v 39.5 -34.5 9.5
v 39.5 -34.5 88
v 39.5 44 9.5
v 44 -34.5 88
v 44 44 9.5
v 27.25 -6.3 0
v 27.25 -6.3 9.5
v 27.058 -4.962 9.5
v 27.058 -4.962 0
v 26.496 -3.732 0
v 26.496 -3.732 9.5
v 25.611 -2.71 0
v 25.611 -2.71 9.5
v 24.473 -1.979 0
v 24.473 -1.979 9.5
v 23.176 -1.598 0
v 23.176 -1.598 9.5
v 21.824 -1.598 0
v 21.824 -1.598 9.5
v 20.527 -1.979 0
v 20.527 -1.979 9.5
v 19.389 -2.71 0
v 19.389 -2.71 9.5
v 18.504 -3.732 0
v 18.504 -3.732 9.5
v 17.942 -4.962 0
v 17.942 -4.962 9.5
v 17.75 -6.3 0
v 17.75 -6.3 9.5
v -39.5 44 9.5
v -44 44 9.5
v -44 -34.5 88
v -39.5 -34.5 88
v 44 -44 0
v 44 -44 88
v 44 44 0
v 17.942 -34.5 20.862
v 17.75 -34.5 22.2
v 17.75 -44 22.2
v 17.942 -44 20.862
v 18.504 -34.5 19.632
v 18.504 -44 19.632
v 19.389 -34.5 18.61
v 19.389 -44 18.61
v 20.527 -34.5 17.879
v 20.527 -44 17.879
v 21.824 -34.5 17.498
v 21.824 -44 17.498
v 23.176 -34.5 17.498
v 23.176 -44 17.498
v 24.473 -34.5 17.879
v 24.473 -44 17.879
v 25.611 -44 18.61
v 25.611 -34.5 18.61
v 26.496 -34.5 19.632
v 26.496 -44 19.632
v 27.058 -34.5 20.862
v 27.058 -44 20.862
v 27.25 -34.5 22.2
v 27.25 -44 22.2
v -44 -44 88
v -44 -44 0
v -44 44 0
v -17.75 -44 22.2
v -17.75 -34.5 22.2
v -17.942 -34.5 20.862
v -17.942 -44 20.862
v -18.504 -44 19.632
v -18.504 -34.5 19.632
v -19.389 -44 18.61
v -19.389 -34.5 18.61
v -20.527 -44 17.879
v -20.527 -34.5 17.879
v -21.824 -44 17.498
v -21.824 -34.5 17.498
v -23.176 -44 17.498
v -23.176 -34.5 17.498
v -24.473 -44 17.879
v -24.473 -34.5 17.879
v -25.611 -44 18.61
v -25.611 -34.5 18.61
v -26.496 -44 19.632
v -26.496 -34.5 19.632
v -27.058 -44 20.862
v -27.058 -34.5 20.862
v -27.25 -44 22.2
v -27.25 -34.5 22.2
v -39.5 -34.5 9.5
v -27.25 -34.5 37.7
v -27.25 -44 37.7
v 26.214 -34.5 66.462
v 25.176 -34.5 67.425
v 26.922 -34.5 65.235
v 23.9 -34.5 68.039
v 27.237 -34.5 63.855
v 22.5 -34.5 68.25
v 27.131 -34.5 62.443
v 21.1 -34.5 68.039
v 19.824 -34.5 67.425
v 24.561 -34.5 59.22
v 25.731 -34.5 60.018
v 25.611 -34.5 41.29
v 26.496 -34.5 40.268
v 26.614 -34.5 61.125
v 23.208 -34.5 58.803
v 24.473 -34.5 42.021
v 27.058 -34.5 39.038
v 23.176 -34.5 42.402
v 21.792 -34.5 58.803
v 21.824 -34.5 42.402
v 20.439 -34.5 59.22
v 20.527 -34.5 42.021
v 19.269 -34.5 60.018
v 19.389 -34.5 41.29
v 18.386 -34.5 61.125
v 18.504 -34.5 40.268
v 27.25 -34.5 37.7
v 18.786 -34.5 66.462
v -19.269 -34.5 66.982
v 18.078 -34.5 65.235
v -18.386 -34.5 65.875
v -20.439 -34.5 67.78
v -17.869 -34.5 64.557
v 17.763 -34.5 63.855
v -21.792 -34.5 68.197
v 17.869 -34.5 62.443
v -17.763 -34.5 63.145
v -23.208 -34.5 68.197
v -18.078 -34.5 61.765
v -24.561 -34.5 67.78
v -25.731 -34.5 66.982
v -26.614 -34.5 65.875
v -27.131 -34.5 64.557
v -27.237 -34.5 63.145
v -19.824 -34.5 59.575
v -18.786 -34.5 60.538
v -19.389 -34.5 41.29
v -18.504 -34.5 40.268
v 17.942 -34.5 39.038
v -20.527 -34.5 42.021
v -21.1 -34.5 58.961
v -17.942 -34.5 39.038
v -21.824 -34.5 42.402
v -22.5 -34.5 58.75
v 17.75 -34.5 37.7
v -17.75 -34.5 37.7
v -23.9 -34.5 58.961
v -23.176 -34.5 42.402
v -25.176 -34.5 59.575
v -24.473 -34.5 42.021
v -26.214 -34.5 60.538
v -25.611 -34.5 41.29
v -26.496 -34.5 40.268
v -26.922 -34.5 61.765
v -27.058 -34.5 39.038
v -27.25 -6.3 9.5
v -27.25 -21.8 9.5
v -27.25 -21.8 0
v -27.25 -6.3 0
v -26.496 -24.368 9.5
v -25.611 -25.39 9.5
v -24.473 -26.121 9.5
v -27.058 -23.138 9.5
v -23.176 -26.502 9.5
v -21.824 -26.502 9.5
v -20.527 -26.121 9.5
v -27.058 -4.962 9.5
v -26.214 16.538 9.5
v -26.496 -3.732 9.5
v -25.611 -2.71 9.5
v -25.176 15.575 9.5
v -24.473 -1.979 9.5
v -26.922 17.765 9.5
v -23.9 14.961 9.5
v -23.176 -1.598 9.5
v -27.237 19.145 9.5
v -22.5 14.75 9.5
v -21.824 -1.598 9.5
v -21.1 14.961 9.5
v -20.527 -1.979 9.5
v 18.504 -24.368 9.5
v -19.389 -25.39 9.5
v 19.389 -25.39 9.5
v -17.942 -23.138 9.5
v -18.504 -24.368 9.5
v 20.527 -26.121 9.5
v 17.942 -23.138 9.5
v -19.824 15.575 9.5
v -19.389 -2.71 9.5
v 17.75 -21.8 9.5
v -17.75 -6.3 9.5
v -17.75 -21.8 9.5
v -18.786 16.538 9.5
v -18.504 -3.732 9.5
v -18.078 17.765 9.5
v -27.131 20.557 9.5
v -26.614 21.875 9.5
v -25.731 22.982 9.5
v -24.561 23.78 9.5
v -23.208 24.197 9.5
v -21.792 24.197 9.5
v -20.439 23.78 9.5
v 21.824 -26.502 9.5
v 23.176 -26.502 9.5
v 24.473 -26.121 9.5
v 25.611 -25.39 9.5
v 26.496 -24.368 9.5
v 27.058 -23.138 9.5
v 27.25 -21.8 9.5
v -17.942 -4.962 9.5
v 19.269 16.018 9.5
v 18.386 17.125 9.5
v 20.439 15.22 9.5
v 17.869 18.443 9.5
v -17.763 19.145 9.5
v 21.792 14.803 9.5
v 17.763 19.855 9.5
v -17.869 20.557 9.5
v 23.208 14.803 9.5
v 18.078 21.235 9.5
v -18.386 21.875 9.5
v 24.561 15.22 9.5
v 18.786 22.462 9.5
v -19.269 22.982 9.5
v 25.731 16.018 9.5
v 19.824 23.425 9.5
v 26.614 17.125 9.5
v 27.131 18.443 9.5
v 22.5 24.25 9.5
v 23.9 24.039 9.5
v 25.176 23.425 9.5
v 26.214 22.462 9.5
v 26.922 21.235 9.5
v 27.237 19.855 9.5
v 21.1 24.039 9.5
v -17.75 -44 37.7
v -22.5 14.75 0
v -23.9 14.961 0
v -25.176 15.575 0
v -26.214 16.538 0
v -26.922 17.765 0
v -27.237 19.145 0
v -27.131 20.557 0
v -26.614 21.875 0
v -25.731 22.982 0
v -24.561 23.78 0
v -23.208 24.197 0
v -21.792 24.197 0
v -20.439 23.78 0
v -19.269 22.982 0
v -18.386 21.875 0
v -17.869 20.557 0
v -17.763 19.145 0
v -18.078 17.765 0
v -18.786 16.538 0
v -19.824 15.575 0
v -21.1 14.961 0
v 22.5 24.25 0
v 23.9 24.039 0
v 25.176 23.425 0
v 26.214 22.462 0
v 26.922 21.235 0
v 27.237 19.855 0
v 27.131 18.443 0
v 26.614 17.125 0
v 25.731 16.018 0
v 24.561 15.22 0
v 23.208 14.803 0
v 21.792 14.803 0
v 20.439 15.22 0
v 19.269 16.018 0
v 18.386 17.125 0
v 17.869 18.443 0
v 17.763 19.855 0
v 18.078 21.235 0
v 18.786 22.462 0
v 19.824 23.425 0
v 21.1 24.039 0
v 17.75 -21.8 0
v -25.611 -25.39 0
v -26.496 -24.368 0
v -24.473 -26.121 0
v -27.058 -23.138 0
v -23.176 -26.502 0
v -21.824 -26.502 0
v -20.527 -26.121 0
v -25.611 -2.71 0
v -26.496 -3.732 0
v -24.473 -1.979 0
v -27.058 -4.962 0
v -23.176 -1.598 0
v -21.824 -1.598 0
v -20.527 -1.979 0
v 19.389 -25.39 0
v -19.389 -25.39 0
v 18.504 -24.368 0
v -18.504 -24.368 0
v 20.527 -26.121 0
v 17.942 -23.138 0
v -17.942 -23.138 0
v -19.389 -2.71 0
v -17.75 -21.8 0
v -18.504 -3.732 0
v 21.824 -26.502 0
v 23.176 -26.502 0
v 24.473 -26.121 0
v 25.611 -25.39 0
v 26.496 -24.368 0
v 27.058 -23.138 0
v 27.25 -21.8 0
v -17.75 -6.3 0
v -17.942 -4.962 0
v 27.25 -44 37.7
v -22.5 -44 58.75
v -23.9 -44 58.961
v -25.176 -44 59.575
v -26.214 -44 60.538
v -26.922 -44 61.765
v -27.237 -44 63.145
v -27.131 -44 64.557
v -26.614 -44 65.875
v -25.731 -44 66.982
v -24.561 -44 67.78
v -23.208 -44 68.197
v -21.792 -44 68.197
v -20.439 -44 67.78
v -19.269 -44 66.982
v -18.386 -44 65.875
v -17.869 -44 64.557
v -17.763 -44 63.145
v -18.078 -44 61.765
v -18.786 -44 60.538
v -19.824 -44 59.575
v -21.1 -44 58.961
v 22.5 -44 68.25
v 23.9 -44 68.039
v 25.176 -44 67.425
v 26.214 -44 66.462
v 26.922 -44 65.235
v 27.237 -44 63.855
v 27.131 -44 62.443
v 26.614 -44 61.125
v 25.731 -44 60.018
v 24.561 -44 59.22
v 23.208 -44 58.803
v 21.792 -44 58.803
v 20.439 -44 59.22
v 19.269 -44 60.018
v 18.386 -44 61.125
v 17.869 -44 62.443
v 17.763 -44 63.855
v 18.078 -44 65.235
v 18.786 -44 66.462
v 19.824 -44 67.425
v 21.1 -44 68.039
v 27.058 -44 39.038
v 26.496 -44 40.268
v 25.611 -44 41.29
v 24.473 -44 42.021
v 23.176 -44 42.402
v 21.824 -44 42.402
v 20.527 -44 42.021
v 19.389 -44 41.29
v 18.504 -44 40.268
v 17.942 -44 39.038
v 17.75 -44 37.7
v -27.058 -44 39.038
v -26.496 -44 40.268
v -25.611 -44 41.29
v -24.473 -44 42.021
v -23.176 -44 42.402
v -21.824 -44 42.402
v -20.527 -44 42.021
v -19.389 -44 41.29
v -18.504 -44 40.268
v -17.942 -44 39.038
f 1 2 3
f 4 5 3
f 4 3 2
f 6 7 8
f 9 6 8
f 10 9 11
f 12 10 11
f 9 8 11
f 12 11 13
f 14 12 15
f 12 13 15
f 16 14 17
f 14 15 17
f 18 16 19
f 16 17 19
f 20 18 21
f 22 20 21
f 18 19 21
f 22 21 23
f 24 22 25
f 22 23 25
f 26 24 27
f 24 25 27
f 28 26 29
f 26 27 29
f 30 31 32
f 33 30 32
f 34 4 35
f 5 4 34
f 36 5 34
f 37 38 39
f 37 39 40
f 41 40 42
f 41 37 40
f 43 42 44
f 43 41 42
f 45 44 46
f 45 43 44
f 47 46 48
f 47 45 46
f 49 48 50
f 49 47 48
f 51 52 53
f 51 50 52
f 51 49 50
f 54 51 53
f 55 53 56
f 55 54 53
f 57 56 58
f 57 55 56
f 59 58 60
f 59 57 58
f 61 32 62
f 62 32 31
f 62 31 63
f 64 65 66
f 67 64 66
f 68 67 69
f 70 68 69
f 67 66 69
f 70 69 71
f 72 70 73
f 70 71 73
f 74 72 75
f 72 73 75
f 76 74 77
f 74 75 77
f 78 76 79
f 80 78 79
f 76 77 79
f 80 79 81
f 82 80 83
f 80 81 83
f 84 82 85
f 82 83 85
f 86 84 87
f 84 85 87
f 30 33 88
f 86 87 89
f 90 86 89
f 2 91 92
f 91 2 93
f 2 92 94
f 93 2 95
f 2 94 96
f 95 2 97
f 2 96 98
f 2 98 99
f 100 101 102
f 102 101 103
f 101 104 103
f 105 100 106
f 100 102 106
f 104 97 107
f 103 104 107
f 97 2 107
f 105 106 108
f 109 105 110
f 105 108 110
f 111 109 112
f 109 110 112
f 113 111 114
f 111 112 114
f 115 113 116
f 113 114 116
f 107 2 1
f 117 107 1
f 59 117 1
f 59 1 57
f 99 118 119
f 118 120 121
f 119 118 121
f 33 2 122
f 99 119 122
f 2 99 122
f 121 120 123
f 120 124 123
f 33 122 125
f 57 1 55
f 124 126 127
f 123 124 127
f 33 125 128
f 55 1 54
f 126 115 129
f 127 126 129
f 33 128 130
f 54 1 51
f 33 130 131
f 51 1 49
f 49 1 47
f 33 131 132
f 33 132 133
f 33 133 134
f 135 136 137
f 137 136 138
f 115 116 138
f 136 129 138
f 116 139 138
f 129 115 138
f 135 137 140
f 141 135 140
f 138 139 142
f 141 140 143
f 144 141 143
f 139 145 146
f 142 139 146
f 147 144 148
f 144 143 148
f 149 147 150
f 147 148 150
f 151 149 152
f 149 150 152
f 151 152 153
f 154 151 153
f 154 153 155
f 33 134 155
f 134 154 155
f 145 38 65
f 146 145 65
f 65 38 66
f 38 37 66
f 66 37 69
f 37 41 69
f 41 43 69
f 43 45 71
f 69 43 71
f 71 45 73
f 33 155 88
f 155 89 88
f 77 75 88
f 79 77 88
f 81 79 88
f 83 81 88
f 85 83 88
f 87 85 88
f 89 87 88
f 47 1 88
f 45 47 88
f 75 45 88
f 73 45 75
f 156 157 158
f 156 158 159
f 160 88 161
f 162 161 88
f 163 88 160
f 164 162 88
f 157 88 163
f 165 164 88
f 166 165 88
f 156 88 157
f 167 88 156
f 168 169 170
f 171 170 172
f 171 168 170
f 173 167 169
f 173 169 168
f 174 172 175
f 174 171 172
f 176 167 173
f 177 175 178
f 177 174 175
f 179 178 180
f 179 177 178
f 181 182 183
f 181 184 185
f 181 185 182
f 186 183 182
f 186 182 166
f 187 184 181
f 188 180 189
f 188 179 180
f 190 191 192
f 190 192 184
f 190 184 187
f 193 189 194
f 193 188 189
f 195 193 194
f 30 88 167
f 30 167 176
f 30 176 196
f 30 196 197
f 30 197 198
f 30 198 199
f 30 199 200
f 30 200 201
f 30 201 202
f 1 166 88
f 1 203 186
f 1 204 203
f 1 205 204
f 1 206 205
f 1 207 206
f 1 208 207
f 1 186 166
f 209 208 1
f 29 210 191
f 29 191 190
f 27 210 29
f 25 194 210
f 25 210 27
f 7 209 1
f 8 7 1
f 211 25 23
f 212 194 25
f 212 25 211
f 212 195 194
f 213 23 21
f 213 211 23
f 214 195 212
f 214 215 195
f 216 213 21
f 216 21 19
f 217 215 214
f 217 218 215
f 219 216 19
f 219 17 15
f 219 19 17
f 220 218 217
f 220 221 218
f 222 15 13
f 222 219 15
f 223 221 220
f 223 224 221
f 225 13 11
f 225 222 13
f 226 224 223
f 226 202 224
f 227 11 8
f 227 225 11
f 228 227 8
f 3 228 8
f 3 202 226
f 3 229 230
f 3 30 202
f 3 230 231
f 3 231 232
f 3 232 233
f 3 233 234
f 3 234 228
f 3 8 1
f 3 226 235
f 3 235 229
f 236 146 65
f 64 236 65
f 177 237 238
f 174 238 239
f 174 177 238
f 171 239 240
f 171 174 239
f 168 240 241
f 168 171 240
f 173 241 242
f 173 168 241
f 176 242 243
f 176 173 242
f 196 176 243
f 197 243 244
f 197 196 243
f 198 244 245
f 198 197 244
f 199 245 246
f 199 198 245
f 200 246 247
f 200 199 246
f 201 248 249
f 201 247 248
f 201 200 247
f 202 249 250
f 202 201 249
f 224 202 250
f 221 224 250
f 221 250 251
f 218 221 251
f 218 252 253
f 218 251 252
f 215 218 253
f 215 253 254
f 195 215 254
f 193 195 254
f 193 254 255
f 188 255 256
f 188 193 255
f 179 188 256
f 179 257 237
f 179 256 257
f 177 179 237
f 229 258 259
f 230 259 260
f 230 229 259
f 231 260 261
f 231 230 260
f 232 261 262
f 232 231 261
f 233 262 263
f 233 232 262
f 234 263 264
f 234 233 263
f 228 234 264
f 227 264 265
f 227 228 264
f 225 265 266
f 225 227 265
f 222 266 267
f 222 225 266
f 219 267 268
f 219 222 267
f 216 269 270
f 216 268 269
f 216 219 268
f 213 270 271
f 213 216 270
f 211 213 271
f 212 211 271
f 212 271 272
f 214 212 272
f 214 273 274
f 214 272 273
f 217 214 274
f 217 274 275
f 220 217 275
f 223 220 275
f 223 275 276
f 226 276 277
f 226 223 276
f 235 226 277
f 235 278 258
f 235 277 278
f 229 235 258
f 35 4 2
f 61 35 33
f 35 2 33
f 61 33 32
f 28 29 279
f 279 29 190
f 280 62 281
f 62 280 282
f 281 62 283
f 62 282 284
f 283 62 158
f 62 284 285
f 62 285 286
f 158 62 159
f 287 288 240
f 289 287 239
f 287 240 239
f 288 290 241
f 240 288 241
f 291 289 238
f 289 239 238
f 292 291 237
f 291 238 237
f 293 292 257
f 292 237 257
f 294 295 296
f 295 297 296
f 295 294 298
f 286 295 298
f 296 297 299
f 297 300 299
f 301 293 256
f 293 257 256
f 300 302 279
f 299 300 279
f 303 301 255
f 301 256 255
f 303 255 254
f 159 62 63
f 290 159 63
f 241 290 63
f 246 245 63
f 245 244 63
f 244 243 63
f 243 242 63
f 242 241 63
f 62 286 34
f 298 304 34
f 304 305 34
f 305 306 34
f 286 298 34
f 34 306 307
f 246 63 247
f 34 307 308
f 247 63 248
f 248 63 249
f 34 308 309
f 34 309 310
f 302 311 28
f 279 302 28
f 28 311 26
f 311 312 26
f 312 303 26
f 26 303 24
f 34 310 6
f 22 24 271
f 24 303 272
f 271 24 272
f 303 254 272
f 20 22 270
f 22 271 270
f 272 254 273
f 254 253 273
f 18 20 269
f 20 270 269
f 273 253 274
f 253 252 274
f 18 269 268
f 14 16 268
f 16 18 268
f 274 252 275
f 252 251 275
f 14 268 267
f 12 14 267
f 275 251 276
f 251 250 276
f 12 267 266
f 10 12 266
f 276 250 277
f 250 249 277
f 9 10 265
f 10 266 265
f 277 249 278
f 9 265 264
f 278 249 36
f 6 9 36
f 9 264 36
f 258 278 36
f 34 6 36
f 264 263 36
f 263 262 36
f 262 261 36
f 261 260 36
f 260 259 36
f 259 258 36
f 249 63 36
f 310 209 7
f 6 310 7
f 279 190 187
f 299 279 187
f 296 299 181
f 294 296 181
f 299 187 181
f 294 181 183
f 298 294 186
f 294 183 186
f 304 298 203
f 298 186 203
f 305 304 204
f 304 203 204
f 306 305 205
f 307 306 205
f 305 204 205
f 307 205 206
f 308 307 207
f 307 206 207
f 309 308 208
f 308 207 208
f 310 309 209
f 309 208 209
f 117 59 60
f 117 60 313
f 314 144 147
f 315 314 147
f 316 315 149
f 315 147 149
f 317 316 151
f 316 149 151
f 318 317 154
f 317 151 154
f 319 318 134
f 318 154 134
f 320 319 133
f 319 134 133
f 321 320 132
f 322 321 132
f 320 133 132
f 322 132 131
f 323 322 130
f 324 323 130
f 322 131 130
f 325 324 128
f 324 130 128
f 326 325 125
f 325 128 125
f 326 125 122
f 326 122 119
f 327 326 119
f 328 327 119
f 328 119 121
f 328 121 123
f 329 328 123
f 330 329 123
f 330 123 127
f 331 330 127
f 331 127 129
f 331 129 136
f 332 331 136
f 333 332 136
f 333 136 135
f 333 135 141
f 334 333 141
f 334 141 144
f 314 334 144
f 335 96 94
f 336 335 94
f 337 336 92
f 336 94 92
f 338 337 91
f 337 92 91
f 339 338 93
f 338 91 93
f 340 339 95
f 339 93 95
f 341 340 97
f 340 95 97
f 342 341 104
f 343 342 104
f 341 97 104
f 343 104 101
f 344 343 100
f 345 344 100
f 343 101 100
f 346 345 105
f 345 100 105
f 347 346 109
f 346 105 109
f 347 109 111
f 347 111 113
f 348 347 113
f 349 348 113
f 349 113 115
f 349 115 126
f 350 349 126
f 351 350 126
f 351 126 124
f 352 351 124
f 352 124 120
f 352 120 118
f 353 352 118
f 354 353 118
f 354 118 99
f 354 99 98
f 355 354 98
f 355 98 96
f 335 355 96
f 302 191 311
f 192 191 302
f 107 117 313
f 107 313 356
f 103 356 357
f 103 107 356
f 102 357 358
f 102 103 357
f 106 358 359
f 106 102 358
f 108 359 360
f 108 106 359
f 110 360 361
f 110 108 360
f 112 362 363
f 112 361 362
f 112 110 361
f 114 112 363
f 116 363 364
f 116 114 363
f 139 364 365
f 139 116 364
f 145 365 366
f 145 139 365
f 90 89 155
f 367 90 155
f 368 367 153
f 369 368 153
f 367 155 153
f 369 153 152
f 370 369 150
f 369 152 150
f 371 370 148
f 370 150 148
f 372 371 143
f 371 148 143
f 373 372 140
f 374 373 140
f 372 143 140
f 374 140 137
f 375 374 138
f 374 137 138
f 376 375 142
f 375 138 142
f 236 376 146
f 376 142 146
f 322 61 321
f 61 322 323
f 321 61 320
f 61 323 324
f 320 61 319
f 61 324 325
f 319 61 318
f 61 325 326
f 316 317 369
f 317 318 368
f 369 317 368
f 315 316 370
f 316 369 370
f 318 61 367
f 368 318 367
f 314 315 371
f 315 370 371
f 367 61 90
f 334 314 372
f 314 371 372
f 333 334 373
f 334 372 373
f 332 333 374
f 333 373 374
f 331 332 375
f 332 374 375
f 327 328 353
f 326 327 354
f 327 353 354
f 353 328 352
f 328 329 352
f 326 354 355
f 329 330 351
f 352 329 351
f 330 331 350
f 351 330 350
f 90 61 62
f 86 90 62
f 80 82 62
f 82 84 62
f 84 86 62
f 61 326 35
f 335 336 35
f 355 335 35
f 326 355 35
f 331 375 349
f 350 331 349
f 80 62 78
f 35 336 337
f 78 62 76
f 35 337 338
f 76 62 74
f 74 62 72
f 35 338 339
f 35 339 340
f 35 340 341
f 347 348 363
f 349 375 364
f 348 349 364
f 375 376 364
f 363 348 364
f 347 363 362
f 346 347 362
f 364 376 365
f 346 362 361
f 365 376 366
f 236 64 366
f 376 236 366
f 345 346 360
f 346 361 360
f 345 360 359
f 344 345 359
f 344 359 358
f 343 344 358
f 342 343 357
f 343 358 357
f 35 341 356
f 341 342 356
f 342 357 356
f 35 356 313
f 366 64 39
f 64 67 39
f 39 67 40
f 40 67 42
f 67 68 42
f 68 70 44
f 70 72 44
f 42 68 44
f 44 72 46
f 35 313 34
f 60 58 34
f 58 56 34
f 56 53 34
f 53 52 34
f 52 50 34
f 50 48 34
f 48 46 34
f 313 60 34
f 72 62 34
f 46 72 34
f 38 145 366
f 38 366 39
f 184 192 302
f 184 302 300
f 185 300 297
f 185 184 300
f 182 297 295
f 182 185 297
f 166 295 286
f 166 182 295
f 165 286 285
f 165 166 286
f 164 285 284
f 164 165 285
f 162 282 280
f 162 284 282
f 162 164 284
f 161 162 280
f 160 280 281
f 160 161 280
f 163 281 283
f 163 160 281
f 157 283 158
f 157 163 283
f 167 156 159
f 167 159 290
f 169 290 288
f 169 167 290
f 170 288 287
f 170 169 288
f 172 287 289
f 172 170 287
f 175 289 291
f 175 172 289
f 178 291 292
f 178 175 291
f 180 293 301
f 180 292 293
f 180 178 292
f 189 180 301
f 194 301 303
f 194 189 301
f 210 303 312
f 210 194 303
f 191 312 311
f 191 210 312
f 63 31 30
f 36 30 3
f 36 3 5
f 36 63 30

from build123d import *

# Parameters (mm, degrees)
SKETCH_1_W          = 88
SKETCH_1_H          = 88
EXTRUDE_1_DEPTH     = 9.5
SKETCH_2_W          = 88
SKETCH_2_H          = 9.5
EXTRUDE_2_DEPTH     = 88
EXTRUDE_3_DEPTH     = 4.5
SKETCH_4_R          = 4.75
CUT_EXTRUDE_1_DEPTH = 126.866000175


with BuildPart() as part:
    # 草图1 → 凸台-拉伸1 (new body)
    with BuildSketch(Plane.XY):
        Rectangle(SKETCH_1_W, SKETCH_1_H)
    extrude(amount=EXTRUDE_1_DEPTH)

    # 草图2 → 凸台-拉伸2 (add)
    with BuildSketch(Plane(origin=(0, 0, 0), x_dir=(-1, 0, 0), z_dir=(0, 0, -1))):
        with Locations((0, -39.25)):
            Rectangle(SKETCH_2_W, SKETCH_2_H)
    extrude(amount=-EXTRUDE_2_DEPTH)

    # 草图3 → 凸台-拉伸3 (add)
    with BuildSketch(Plane.ZY.offset(44)):
        Polygon((9.5, 44), (88, -34.5), (9.5, -34.5), align=None)
    extrude_3 = extrude(amount=-EXTRUDE_3_DEPTH)

    # 镜向1: 凸台-拉伸3 across plane
    add(extrude_3.mirror(Plane(origin=(0, 0, 0), x_dir=(0, 0, 1), z_dir=(1, 0, 0))))

    # 草图4 → 切除-拉伸1 (cut, through all)
    with BuildSketch(Plane(origin=(0, -34.5, 0), x_dir=(1, 0, 0), z_dir=(0, 1, 0))):
        with Locations(Location((22.5, -63.5, 0), (0, 0, 270))):
            Circle(SKETCH_4_R)
        with Locations(Location((-22.5, -63.5, 0), (0, 0, 90))):
            Circle(SKETCH_4_R)
        with BuildLine():
            Line((17.75, -37.7), (17.75, -22.2))
            ThreePointArc((17.75, -22.2), (22.5, -17.45), (27.25, -22.2))
            Line((27.25, -22.2), (27.25, -37.7))
            ThreePointArc((27.25, -37.7), (22.5, -42.45), (17.75, -37.7))
        make_face()
        with BuildLine():
            Line((-17.75, -37.7), (-17.75, -22.2))
            ThreePointArc((-17.75, -22.2), (-22.5, -17.45), (-27.25, -22.2))
            Line((-27.25, -22.2), (-27.25, -37.7))
            ThreePointArc((-27.25, -37.7), (-22.5, -42.45), (-17.75, -37.7))
        make_face()
    cut_extrude_1 = extrude(amount=-CUT_EXTRUDE_1_DEPTH, mode=Mode.SUBTRACT)

    # 镜向2: 切除-拉伸1 across plane
    add(cut_extrude_1.mirror(Plane(origin=(0, -22, 22), x_dir=(0, 0.7071067811865476, 0.7071067811865476), z_dir=(0, -0.7071067811865477, 0.7071067811865475))), mode=Mode.SUBTRACT)


solid = part.part
